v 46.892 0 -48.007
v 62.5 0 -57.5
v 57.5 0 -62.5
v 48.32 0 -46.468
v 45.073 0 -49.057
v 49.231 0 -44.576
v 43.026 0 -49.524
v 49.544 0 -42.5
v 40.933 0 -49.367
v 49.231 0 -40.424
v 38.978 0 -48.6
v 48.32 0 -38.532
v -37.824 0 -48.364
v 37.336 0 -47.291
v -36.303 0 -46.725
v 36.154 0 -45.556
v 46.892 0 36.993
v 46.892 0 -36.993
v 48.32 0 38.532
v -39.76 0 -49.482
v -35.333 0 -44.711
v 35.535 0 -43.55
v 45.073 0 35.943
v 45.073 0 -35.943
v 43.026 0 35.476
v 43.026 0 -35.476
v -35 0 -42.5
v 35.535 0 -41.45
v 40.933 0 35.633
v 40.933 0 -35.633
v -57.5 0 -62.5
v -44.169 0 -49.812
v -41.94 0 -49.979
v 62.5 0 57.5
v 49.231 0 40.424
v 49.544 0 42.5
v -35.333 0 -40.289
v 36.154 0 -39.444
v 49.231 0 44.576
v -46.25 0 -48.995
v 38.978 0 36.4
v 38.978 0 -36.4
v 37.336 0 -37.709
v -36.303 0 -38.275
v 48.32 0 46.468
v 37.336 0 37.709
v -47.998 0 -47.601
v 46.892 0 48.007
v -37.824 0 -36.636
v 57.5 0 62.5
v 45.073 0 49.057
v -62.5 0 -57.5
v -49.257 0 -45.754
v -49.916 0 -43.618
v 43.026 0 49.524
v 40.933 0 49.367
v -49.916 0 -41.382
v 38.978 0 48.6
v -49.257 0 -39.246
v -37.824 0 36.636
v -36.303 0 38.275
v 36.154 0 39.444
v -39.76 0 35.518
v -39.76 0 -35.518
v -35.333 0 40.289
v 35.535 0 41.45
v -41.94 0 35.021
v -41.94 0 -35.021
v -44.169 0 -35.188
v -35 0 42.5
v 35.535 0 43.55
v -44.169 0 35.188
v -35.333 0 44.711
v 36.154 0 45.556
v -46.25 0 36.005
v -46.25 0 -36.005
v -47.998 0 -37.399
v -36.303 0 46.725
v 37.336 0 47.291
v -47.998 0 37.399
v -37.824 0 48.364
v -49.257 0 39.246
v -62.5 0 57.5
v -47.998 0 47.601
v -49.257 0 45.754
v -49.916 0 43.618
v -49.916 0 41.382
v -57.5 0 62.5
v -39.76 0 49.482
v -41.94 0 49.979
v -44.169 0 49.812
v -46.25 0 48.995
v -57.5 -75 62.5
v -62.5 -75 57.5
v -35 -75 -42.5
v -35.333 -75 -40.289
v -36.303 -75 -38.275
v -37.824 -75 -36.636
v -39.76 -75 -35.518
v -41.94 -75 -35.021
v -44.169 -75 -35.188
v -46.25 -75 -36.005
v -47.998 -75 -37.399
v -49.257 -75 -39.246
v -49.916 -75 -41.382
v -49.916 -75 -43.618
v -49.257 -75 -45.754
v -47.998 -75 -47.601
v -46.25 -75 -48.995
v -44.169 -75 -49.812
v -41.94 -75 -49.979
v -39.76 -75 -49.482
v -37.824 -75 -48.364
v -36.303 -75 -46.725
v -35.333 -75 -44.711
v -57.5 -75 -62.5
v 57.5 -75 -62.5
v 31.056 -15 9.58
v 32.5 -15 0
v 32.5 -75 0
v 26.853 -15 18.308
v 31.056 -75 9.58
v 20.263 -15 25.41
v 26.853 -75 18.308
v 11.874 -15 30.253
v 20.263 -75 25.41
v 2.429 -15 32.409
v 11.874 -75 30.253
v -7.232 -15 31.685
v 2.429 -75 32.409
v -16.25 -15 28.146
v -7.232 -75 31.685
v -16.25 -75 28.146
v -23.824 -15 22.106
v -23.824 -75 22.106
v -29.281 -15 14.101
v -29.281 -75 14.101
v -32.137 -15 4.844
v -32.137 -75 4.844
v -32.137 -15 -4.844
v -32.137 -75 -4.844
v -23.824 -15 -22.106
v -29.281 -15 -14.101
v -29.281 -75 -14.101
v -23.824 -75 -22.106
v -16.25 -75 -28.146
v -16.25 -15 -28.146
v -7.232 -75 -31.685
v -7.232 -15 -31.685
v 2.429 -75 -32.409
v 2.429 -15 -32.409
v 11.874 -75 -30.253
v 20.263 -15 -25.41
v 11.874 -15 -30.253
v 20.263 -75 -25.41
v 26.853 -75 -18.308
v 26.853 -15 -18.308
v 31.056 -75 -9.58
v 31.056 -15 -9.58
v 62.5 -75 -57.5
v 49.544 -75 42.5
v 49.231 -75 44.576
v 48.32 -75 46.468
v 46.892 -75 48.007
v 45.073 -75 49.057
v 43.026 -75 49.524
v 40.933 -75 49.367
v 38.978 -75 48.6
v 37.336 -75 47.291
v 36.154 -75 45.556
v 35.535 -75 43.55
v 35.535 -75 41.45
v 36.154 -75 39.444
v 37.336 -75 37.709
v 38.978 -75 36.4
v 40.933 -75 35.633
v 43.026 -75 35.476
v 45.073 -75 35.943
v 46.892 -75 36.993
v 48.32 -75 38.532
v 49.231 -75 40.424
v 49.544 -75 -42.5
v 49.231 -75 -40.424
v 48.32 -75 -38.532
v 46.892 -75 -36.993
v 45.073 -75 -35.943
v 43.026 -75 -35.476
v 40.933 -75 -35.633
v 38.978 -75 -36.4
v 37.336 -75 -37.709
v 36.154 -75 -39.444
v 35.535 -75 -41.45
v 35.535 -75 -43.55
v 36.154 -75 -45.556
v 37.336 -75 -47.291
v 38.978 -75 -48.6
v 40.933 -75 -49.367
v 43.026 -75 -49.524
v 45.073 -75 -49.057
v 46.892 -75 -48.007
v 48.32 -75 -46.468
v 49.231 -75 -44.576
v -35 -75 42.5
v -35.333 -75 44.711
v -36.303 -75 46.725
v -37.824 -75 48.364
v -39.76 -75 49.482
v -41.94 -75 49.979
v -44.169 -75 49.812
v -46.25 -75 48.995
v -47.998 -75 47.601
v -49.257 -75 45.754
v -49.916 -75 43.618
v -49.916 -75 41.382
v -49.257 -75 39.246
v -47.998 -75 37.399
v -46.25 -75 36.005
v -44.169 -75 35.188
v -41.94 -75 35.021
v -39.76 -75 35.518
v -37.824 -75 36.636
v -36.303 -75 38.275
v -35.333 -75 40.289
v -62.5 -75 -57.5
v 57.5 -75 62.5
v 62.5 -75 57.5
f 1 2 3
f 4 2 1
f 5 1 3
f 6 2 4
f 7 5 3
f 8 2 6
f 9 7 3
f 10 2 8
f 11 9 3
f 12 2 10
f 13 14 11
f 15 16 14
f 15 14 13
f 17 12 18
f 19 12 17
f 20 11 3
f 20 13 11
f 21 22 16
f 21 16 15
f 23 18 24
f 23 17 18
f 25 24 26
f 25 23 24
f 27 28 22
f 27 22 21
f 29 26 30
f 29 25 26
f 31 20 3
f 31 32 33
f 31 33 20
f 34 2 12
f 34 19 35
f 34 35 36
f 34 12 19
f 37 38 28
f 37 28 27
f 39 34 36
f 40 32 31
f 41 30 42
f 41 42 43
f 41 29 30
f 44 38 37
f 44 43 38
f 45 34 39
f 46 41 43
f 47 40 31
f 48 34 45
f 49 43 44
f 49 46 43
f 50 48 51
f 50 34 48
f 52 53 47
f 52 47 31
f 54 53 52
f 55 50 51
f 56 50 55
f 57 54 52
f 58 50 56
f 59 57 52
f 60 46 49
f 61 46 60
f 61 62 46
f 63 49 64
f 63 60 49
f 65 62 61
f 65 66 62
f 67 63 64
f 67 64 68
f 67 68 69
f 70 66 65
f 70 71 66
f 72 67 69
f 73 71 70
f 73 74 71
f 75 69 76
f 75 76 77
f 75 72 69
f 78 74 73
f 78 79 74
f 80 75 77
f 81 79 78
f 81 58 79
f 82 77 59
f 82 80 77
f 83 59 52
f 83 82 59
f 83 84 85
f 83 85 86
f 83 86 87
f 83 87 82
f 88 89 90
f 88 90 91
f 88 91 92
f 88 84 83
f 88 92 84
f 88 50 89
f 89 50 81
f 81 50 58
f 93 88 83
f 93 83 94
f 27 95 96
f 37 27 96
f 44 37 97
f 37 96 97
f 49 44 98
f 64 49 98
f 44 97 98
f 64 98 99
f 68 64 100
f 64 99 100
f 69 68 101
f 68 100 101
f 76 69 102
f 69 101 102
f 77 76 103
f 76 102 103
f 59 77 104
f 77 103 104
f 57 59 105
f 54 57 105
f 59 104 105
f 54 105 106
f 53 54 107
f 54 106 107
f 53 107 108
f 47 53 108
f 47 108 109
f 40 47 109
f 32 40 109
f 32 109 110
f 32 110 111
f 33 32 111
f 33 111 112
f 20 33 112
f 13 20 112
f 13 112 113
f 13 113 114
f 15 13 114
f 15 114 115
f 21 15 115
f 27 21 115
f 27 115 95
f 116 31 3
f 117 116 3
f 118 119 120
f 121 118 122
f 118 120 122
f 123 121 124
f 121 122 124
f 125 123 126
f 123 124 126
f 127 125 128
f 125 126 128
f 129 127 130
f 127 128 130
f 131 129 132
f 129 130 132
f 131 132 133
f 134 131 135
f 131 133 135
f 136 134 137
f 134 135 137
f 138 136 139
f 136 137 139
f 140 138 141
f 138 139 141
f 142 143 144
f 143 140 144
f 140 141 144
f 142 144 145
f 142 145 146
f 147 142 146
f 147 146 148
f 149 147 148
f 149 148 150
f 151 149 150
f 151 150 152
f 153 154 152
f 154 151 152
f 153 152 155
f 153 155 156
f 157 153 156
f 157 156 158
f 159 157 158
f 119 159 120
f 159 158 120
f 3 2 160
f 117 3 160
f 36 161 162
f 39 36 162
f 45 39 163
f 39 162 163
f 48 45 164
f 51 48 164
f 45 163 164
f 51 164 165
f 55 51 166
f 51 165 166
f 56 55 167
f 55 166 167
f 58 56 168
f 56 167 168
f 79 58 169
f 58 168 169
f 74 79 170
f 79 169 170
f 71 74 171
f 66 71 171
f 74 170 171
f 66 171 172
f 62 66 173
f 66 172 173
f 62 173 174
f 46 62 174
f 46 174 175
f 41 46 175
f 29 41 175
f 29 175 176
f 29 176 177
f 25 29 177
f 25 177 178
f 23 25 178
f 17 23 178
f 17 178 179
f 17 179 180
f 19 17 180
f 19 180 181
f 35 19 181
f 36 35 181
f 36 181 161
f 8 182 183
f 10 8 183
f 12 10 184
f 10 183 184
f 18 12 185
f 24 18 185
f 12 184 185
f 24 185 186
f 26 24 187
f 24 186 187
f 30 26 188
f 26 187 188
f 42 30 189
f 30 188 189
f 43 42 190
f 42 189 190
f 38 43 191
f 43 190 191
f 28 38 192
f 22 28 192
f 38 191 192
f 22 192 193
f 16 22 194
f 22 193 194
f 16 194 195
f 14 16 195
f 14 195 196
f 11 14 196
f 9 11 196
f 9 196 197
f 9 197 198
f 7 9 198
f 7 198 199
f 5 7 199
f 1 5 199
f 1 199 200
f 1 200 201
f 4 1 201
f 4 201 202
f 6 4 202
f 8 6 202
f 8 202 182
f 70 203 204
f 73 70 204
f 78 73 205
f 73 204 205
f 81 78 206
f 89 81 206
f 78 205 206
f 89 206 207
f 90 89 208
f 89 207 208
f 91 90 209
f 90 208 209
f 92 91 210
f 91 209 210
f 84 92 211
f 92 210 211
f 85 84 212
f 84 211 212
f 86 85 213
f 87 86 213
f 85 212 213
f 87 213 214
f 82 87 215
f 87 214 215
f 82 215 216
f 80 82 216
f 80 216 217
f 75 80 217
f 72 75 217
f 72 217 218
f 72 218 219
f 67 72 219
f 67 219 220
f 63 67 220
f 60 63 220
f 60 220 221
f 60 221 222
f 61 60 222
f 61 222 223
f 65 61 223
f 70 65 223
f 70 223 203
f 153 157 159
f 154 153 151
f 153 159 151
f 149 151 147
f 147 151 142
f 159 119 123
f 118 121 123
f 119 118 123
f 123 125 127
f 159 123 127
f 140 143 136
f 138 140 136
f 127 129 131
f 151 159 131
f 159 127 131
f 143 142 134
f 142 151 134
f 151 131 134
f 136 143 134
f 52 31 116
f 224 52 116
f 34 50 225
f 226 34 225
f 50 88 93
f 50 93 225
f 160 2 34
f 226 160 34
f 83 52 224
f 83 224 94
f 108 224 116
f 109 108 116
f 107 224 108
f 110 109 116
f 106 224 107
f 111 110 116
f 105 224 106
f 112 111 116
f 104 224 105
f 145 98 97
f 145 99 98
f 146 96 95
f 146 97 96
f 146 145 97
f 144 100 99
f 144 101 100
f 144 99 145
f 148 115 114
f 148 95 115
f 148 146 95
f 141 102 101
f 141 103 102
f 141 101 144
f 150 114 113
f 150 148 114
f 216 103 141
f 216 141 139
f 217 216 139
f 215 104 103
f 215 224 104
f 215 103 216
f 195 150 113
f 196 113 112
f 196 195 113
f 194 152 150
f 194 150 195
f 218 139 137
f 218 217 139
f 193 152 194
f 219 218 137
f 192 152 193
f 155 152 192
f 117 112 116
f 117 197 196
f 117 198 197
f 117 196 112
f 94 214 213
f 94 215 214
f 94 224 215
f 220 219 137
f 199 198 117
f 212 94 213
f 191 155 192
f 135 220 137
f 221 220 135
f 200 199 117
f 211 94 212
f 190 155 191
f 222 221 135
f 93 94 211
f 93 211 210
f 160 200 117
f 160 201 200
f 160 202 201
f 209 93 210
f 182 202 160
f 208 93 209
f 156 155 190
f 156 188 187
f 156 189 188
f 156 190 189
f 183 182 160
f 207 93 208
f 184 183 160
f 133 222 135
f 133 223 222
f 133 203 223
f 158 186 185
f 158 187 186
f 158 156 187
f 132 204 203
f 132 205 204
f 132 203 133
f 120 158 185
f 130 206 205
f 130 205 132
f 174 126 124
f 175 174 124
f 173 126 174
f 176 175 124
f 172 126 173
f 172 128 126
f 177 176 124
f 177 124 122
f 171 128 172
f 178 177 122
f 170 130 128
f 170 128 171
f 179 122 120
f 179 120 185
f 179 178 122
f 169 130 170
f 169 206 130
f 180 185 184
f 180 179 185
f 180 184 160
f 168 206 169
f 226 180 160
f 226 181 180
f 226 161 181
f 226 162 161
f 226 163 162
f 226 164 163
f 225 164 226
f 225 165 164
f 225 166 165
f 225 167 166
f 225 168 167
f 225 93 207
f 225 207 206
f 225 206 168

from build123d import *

# Parameters (mm, degrees)
F0_W     = 125
F0_H     = 125
F1_DEPTH = 75
F2_SIZE  = 5
F3_R     = 7.5
F3_R_2   = 7.043913
F4_DEPTH = 75.001
F5_R     = 32.5
F6_DEPTH = 75.001
F7_R     = 32.5
F8_DEPTH = 15


with BuildPart() as f1:
    # F0 (on Front) → F1 (new body)
    with BuildSketch(Plane.XZ):
        Rectangle(F0_W, F0_H)
    extrude(amount=F1_DEPTH)

    # F2
    f2_edges = [f1.edges().sort_by_distance(p)[0] for p in [
        (62.5, -37.5, 62.5),
        (-62.5, -37.5, 62.5),
        (62.5, -37.5, -62.5),
        (-62.5, -37.5, -62.5),
    ]]
    chamfer(f2_edges, length=F2_SIZE)

    # F3 (on face) → F4 (cut, through all)
    with BuildSketch(Plane.XZ.offset(75)):
        with Locations((-42.5, 42.5)):
            Circle(F3_R)
        with Locations((-42.5, -42.5)):
            Circle(F3_R)
        with Locations((42.5, -42.5)):
            Circle(F3_R_2)
        with Locations((42.5, 42.5)):
            Circle(F3_R_2)
    extrude(amount=-F4_DEPTH, mode=Mode.SUBTRACT)

    # F5 (on face) → F6 (cut, through all)
    with BuildSketch(Plane.XZ.offset(75)):
        Circle(F5_R)
    extrude(amount=-F6_DEPTH, mode=Mode.SUBTRACT)

    # F7 (on face) → F8 (join)
    with BuildSketch(Plane(origin=(0, 0, 0), x_dir=(-1, 0, 0), z_dir=(0, 1, 0))):
        Circle(F7_R)
    extrude(amount=-F8_DEPTH)


solid = f1.part
